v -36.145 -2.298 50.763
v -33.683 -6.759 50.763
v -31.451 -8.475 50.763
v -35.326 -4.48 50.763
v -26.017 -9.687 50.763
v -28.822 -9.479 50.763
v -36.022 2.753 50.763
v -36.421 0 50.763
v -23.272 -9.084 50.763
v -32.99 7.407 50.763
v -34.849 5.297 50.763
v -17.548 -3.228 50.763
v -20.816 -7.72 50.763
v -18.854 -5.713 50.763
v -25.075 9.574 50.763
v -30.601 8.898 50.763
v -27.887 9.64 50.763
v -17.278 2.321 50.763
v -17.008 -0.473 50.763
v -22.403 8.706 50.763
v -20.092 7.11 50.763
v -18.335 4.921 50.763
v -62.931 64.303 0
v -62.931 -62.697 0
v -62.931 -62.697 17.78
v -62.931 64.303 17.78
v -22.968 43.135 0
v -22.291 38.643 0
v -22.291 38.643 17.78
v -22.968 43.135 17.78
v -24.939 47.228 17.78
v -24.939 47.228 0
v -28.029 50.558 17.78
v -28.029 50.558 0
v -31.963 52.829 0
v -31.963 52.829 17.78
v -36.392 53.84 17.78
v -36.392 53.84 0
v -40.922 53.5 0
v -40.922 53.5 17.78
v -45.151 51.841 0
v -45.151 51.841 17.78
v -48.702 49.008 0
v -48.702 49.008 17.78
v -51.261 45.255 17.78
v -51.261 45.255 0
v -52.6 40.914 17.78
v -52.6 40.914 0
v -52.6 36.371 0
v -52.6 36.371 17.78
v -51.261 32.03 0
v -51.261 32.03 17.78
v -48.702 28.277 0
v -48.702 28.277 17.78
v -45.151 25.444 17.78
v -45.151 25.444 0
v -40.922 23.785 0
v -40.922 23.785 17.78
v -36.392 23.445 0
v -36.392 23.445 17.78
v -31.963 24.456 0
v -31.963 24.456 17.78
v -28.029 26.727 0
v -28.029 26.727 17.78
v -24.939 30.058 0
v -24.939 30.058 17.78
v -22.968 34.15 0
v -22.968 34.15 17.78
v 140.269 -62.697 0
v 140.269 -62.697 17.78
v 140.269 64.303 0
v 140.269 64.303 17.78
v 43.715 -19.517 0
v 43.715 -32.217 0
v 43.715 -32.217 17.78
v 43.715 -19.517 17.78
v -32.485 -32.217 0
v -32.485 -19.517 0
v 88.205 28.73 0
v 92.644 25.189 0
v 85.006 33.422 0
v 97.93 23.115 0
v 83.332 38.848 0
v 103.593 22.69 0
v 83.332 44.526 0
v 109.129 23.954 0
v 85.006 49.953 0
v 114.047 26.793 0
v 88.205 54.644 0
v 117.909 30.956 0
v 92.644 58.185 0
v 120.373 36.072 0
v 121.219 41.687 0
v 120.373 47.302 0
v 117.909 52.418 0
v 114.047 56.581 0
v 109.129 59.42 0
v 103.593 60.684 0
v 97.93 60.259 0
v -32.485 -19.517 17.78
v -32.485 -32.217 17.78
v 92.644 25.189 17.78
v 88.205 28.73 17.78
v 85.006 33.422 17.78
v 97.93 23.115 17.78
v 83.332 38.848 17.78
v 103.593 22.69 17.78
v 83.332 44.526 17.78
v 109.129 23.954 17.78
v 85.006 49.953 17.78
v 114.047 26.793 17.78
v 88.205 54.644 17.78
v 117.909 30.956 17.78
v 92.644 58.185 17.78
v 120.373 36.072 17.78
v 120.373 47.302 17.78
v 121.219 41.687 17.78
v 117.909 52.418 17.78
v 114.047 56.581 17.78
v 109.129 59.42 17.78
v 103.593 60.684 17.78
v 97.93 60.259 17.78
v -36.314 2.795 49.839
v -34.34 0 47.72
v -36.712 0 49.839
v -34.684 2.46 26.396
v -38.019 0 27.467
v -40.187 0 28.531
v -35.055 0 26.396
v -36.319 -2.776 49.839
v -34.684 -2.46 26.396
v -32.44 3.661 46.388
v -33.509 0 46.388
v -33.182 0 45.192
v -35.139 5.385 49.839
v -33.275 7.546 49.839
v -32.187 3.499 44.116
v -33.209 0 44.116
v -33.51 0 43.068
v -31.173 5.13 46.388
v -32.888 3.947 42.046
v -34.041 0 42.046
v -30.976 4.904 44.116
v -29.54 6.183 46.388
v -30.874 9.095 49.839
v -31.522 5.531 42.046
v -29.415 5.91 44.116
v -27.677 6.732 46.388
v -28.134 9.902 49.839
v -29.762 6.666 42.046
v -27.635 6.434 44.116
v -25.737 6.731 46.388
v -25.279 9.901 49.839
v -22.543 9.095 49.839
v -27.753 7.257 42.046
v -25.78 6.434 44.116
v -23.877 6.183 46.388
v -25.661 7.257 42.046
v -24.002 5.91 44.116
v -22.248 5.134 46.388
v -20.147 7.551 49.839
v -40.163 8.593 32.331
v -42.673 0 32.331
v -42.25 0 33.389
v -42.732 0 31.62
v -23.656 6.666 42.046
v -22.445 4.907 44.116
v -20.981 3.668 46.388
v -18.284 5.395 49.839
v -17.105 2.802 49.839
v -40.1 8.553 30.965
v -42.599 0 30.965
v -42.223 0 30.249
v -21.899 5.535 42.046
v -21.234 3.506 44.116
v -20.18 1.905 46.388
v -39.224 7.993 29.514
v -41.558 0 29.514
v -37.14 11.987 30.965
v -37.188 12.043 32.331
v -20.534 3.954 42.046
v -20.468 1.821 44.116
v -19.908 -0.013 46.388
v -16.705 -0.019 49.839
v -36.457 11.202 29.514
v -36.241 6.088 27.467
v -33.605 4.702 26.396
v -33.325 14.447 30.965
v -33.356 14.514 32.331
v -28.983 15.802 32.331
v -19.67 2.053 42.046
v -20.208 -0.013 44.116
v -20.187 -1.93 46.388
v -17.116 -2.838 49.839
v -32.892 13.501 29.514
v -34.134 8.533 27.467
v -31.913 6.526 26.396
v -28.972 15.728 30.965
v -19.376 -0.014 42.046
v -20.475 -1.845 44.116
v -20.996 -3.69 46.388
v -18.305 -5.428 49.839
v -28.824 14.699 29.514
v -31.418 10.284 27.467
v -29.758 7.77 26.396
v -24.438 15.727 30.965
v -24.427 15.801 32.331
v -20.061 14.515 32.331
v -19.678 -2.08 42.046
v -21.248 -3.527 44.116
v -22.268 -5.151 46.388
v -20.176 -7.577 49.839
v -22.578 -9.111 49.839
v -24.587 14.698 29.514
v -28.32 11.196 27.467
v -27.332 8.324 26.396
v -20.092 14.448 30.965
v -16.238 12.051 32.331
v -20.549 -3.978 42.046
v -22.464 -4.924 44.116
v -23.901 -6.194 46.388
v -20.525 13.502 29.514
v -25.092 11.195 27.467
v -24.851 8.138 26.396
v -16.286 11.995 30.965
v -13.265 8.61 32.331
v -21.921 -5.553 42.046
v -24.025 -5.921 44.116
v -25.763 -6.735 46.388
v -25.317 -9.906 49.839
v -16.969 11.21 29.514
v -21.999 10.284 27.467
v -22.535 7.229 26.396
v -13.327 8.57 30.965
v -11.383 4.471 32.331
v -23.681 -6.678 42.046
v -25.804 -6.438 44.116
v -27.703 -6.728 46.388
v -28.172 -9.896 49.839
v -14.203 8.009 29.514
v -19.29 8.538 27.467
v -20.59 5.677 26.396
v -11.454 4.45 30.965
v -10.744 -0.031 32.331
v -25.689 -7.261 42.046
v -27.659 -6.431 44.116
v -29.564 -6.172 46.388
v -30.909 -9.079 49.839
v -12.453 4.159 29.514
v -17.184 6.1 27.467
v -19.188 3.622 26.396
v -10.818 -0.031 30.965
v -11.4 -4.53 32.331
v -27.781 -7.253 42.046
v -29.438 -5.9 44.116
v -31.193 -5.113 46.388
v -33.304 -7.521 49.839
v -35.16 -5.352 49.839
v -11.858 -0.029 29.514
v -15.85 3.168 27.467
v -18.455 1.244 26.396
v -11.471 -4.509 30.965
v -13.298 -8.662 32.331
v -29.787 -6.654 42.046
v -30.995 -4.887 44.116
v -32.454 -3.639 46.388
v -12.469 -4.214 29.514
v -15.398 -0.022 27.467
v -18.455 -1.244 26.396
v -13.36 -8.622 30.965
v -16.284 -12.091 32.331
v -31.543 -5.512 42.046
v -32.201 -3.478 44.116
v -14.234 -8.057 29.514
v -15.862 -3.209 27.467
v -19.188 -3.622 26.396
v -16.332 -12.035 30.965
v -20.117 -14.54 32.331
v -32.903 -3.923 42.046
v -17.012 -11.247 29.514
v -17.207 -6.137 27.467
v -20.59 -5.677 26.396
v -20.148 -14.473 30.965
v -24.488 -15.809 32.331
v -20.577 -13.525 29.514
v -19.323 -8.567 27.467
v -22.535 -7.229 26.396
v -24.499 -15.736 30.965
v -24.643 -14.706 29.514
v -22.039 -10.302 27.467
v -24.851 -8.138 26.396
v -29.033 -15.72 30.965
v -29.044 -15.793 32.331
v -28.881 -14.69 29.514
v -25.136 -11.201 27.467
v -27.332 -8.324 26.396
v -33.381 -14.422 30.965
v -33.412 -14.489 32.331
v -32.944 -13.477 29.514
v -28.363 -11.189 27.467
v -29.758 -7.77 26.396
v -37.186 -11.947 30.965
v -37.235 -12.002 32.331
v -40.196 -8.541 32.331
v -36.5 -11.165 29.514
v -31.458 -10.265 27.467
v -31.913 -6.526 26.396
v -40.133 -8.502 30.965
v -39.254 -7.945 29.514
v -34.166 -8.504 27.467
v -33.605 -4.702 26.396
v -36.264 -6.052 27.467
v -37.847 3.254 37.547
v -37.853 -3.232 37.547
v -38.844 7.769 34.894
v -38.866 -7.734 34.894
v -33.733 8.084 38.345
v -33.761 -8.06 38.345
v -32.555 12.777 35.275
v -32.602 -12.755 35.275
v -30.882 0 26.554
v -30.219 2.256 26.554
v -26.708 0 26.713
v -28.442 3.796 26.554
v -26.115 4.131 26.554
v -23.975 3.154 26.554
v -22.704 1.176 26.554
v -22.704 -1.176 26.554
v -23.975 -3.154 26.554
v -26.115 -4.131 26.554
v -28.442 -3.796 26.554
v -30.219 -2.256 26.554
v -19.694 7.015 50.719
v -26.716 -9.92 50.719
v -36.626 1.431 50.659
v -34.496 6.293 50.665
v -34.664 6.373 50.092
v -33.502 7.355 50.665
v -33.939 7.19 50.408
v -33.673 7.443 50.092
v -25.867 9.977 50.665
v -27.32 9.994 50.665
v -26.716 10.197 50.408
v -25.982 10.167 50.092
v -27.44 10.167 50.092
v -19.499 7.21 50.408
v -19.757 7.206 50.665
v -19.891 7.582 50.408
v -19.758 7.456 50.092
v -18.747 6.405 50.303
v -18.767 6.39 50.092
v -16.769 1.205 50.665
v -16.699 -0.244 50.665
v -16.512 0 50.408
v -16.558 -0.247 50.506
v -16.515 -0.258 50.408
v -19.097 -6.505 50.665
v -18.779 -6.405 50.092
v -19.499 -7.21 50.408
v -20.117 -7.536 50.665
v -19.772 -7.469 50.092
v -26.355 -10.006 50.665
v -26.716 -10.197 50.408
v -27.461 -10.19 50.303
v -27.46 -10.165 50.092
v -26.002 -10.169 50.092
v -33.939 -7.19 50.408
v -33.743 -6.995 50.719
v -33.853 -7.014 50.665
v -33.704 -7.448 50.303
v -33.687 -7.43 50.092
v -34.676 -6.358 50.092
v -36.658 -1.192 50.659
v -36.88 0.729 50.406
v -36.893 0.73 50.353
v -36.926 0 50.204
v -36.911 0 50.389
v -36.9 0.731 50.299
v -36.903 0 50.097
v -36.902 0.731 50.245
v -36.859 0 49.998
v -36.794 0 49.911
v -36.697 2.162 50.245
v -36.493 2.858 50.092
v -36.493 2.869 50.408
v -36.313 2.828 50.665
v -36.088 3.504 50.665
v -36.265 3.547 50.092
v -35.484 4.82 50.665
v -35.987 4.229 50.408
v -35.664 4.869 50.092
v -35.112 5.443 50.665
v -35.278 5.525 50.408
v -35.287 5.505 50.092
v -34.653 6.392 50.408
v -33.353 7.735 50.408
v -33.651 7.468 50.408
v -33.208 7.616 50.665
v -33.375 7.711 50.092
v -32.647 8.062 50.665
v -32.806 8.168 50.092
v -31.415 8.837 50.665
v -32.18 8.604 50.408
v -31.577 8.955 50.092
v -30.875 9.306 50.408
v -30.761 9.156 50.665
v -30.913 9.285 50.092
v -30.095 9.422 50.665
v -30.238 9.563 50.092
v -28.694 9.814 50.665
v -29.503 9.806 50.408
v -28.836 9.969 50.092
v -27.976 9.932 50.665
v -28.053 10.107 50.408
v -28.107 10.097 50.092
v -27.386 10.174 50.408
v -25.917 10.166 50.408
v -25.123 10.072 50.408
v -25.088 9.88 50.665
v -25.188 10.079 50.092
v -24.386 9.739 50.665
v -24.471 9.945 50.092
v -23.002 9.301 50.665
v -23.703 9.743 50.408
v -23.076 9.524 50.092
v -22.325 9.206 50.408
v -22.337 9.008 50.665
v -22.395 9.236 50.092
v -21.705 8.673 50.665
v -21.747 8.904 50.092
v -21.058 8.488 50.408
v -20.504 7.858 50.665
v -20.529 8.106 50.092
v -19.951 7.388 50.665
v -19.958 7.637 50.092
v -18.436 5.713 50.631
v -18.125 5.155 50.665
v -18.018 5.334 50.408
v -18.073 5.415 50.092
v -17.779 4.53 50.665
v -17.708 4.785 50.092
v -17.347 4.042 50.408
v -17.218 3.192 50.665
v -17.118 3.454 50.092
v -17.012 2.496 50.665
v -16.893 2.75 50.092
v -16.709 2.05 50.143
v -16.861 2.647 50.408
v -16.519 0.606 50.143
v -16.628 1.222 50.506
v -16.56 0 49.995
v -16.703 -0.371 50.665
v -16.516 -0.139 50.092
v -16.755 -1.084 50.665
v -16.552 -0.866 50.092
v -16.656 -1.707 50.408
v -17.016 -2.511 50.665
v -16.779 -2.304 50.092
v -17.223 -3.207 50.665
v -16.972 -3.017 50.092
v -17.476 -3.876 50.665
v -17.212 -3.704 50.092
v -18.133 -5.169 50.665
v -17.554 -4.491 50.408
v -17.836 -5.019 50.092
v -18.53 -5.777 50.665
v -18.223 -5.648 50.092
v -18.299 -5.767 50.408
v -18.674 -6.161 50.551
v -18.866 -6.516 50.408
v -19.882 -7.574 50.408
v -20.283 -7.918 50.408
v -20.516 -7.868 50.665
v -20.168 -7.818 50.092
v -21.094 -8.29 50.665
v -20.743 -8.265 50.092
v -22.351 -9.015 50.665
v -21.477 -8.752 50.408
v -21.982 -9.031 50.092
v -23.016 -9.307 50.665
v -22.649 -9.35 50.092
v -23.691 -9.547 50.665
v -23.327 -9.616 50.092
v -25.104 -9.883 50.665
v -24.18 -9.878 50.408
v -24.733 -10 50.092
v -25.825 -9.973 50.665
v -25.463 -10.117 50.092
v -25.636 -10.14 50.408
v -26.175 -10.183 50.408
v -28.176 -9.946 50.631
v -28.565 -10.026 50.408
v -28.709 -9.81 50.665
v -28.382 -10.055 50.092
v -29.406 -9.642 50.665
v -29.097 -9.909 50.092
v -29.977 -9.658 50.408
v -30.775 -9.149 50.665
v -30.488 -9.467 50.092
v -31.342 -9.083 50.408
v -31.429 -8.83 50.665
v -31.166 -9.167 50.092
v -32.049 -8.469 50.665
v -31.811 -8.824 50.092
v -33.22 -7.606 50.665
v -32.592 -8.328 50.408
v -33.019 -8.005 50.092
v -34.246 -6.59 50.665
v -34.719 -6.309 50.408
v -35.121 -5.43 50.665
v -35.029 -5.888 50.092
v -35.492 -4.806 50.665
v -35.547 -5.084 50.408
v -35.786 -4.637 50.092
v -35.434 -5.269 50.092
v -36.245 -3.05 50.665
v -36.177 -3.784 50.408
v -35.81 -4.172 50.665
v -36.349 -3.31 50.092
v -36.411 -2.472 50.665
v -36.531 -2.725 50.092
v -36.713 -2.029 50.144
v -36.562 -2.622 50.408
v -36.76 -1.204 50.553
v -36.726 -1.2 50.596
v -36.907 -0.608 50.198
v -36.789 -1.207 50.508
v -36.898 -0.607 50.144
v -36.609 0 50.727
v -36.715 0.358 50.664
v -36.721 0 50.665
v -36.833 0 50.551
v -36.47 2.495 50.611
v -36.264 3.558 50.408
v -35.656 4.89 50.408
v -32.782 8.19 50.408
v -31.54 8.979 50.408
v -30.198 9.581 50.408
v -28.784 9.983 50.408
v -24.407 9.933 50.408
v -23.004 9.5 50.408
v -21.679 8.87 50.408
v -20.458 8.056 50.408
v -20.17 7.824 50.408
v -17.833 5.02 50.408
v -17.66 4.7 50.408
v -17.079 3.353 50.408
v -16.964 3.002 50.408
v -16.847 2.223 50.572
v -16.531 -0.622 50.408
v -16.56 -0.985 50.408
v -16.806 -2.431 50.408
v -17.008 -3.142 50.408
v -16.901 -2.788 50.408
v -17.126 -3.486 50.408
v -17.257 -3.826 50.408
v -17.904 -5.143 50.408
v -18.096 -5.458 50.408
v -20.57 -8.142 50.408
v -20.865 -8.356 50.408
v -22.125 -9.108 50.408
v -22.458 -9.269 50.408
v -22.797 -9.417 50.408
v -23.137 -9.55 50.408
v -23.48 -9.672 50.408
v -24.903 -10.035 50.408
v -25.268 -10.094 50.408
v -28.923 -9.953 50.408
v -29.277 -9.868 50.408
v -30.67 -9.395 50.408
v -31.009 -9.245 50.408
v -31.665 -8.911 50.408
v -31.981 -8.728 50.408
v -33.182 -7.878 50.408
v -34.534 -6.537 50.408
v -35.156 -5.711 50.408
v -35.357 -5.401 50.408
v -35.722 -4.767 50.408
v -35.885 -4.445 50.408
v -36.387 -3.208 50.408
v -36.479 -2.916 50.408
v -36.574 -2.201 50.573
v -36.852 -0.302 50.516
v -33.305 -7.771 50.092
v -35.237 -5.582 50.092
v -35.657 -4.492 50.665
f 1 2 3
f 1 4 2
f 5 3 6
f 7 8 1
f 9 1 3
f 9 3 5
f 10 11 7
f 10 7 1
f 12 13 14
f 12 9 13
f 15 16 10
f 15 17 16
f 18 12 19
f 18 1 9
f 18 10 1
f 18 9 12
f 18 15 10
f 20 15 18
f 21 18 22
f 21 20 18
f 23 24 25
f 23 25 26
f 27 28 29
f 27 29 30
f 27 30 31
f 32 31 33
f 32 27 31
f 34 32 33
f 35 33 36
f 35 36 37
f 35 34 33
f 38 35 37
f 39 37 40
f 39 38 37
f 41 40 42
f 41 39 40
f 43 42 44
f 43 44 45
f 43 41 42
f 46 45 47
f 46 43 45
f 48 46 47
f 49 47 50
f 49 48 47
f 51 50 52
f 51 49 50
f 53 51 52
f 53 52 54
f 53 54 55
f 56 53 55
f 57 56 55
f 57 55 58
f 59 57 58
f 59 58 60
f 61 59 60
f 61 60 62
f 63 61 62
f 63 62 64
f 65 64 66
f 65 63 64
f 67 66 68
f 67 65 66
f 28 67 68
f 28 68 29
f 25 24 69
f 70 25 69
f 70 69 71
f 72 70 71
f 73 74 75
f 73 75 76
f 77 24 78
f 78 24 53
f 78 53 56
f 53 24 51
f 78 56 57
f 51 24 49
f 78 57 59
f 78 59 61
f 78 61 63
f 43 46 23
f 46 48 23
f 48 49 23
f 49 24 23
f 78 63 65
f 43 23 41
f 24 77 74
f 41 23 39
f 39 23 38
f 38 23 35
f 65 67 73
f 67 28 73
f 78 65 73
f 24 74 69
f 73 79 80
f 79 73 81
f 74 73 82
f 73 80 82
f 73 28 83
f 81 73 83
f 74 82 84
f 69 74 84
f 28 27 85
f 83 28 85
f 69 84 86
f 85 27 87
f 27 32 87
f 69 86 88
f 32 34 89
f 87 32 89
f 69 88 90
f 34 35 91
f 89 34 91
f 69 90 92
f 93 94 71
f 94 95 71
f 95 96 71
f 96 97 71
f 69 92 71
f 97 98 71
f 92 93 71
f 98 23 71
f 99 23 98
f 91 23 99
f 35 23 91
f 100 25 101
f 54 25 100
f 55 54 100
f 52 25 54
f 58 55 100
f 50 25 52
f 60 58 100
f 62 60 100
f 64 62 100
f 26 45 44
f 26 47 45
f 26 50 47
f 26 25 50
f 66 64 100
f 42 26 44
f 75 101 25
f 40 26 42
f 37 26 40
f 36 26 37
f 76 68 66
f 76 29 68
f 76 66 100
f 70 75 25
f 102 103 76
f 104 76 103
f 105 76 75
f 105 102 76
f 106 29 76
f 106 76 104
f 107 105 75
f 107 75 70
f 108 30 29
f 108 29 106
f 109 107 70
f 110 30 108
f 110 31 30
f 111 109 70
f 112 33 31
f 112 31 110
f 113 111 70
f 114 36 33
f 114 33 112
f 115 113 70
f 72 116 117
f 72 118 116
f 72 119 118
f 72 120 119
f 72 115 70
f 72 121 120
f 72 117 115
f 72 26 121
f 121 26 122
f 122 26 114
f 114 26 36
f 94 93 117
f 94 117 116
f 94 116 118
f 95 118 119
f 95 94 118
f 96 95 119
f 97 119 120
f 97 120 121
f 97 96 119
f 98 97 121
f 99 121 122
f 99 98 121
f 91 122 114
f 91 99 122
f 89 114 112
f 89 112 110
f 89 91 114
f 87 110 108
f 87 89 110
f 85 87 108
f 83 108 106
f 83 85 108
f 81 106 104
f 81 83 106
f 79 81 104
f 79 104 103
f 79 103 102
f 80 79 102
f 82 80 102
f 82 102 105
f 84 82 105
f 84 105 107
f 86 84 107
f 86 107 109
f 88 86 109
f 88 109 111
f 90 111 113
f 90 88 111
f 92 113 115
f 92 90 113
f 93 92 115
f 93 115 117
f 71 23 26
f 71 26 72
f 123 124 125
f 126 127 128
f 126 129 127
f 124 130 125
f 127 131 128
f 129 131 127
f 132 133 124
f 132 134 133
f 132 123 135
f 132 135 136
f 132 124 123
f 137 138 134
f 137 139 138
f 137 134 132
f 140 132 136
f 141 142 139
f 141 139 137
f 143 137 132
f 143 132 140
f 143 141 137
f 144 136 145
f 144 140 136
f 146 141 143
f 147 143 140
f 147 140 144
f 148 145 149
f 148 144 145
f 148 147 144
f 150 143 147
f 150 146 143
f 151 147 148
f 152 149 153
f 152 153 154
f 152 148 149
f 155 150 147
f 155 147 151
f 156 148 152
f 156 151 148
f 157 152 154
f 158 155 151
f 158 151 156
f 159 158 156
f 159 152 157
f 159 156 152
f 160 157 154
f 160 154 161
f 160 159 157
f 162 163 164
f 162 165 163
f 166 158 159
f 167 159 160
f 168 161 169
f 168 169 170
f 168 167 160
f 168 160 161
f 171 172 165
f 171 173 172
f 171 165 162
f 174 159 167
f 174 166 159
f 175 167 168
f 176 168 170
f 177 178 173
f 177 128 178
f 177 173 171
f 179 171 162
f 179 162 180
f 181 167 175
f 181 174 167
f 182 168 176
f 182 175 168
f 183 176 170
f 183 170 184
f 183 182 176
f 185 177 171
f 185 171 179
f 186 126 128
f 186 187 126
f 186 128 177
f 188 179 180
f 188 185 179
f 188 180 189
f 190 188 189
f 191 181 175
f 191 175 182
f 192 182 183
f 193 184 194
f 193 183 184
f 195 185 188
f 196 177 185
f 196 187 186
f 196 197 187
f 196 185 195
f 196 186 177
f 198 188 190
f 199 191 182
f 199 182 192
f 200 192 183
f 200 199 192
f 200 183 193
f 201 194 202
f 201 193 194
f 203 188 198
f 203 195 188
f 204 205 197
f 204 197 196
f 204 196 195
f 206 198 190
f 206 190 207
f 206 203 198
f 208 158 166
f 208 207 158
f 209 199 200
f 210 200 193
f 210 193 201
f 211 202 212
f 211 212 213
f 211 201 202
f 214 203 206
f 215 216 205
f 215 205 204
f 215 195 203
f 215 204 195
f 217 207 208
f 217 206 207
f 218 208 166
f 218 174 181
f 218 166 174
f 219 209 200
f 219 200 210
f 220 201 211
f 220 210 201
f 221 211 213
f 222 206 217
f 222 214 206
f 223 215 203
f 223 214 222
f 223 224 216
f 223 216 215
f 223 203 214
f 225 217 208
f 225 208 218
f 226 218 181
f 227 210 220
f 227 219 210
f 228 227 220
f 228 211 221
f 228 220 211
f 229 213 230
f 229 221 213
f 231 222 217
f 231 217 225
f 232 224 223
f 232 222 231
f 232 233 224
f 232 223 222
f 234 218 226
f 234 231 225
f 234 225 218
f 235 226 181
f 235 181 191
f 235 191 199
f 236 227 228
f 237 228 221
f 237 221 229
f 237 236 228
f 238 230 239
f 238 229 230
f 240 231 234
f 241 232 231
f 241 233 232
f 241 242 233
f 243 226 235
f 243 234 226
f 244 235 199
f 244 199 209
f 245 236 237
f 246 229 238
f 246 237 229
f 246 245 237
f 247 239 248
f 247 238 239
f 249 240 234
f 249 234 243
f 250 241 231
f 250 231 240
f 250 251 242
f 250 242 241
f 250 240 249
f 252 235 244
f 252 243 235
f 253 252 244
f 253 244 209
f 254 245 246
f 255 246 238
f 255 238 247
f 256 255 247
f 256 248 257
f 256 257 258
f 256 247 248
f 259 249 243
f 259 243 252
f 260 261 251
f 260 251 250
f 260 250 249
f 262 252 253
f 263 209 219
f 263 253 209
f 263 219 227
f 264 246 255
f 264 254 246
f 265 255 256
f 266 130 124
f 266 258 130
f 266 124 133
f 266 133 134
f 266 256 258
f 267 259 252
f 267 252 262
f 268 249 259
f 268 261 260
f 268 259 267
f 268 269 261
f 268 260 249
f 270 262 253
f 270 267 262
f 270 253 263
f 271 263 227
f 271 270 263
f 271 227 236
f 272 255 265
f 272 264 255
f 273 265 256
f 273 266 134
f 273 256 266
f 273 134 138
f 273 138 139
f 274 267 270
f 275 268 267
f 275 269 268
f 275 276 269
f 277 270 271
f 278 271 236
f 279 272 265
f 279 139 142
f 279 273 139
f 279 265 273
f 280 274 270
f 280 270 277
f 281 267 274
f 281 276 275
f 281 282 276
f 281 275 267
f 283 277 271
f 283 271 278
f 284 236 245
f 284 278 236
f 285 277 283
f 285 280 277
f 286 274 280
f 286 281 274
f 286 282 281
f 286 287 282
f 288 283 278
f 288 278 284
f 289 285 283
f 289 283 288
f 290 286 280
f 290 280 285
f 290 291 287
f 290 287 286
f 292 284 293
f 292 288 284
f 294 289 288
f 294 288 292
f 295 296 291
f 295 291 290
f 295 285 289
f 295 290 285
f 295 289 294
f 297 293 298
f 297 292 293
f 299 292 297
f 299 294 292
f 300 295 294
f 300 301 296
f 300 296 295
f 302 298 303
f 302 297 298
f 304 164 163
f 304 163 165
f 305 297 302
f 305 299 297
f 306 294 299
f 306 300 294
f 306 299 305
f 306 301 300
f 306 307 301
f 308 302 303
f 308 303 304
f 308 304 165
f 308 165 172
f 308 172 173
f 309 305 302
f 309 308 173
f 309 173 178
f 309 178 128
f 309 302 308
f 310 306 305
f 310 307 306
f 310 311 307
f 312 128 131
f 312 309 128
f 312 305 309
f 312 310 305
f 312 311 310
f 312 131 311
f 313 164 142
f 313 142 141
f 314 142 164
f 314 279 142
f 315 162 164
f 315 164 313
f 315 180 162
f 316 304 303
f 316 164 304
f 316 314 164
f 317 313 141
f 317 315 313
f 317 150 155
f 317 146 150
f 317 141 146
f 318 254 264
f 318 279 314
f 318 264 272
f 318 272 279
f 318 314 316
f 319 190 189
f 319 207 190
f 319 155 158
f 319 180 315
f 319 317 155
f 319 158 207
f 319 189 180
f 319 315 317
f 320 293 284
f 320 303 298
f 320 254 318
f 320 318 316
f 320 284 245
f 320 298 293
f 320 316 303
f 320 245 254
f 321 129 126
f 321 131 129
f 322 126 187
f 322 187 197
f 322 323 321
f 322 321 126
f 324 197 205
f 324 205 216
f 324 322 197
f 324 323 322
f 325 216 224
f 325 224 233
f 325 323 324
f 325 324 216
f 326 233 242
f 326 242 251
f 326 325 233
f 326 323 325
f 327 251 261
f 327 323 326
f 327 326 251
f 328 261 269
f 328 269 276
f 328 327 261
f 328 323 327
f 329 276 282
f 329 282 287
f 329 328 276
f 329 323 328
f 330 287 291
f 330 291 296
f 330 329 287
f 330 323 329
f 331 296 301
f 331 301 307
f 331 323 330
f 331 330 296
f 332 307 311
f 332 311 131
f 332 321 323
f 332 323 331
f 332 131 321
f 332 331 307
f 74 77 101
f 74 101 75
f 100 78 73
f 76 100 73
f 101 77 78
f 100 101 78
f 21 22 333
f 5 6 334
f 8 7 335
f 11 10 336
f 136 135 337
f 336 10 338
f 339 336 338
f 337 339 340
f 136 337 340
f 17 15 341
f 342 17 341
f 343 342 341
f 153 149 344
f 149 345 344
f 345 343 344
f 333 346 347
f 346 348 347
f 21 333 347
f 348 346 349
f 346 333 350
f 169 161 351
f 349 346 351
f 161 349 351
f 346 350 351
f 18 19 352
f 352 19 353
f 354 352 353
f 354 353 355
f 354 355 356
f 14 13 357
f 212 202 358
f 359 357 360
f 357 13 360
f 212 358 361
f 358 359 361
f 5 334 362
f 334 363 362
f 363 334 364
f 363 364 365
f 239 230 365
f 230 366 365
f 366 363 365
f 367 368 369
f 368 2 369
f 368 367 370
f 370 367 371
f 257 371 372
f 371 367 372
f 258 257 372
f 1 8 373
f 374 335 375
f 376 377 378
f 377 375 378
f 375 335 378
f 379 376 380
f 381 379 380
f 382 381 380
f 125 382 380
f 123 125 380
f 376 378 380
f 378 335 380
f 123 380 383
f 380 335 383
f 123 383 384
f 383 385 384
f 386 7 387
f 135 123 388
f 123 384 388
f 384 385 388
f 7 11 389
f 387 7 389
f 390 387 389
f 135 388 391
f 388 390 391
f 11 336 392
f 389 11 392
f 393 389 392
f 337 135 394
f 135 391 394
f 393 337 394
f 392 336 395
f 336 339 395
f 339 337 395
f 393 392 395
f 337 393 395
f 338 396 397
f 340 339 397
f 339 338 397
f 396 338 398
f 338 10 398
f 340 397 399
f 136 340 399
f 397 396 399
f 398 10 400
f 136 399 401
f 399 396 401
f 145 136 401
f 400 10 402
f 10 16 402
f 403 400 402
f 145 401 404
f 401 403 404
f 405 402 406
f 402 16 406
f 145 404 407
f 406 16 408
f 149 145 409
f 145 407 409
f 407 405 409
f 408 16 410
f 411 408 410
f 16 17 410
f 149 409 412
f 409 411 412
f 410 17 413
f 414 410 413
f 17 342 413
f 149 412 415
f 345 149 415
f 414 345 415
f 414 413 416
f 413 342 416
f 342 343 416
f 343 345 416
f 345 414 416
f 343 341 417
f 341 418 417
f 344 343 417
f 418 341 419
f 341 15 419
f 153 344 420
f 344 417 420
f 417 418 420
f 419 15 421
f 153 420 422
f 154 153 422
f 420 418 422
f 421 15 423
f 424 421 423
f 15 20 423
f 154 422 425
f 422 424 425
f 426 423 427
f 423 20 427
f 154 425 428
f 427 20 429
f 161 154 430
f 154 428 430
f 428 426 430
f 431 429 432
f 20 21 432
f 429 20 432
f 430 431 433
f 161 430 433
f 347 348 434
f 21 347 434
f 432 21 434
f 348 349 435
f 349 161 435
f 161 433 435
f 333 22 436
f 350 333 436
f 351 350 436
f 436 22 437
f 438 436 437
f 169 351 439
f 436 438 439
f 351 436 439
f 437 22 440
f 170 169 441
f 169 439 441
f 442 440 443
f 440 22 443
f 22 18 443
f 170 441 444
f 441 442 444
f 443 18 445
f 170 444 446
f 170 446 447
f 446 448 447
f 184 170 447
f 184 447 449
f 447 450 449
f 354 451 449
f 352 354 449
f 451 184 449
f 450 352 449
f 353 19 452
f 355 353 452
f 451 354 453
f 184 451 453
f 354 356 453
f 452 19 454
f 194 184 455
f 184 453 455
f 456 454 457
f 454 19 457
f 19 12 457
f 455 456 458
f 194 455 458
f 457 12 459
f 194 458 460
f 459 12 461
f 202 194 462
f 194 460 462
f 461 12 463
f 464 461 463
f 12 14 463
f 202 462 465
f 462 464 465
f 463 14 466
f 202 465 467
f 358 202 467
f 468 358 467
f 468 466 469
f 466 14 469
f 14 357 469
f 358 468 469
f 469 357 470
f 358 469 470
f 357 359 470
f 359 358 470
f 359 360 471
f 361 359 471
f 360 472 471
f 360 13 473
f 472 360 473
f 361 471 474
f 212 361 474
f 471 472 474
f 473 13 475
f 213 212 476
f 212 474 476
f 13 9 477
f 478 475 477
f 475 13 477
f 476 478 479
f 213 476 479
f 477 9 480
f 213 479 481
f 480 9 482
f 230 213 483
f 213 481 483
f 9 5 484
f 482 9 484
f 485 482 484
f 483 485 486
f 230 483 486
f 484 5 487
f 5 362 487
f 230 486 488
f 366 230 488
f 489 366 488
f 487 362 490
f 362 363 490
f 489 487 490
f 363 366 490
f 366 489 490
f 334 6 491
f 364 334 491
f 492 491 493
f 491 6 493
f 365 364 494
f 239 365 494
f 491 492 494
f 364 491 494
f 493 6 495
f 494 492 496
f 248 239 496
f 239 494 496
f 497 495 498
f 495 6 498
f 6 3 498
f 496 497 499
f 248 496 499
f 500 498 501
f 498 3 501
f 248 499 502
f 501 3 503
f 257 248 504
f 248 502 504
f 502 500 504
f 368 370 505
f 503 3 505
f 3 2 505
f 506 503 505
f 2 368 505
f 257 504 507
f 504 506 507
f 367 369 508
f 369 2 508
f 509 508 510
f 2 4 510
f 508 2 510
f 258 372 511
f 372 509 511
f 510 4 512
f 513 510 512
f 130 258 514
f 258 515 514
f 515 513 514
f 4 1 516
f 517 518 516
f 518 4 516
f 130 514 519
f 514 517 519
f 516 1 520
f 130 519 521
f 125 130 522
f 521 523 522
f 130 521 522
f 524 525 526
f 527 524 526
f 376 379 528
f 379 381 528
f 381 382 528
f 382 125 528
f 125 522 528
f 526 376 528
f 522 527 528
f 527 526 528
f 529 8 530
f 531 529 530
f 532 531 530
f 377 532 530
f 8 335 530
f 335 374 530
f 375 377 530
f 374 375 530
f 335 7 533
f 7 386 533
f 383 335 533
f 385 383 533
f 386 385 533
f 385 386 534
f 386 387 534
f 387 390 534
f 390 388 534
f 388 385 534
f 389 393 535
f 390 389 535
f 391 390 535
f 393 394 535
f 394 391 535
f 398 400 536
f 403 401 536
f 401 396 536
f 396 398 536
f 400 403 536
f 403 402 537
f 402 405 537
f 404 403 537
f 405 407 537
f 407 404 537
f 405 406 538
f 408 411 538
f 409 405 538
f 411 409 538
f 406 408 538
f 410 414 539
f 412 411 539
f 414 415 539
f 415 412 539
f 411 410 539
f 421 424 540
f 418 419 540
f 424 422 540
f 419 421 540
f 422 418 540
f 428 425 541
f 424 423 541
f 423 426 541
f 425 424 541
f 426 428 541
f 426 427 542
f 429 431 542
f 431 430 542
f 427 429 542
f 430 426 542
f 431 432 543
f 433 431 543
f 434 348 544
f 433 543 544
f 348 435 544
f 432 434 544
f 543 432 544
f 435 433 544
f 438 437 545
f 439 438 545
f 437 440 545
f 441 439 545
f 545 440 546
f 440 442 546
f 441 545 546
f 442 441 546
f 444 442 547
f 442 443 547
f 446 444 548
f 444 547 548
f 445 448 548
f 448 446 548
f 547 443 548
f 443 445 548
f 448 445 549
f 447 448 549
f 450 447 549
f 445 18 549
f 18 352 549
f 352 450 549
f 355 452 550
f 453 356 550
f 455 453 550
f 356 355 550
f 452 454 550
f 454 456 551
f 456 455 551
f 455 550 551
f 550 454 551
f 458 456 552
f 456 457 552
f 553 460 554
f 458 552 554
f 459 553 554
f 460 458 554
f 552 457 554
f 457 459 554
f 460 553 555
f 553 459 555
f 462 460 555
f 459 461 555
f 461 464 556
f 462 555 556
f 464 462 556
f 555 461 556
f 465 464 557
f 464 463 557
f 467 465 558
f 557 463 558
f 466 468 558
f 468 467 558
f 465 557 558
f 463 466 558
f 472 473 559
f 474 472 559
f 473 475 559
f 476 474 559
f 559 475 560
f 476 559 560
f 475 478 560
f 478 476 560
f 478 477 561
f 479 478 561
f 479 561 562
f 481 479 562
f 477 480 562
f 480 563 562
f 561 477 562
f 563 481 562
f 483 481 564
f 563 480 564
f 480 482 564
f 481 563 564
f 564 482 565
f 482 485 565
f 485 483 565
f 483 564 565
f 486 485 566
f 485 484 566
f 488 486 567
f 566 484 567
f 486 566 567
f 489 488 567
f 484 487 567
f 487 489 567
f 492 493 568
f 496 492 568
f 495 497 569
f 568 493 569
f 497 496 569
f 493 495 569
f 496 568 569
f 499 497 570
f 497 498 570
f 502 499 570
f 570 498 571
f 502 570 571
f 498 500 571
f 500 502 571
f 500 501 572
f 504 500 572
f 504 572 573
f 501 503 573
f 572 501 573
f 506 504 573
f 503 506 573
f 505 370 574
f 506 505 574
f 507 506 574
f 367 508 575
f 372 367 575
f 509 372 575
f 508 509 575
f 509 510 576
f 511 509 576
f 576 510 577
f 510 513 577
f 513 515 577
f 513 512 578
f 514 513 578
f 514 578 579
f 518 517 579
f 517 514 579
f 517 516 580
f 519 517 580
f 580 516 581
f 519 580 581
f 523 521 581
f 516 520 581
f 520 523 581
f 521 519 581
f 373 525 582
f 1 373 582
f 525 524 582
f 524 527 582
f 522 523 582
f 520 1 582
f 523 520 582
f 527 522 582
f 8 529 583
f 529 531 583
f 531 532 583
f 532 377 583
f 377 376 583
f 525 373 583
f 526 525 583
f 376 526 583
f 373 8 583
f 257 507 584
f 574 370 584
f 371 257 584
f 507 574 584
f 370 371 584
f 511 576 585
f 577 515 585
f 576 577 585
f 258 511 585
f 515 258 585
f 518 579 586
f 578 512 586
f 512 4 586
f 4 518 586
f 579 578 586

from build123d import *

# Parameters (mm, degrees)
F0_W     = 203.2
F0_H     = 127
F0_W_2   = 76.2
F0_H_2   = 12.7
F0_R     = 15.24
F0_R_2   = 19.05
F1_DEPTH = 17.78
F4_R     = 0.508


with BuildPart() as f1:
    # F0 (on Top) → F1 (new body)
    with BuildSketch(Plane.XY):
        with Locations((38.6694358299, 0.803489238)):
            Rectangle(F0_W, F0_H)
        with Locations((5.614640674, -25.866510762)):
            Rectangle(F0_W_2, F0_H_2, mode=Mode.SUBTRACT)
        with Locations((-37.5305641701, 38.6425306101)):
            Circle(F0_R, mode=Mode.SUBTRACT)
        with Locations((102.1694358299, 41.6870533127)):
            Circle(F0_R_2, mode=Mode.SUBTRACT)
    extrude(amount=F1_DEPTH)


with BuildPart() as f3:
    # F2 (on Front) → F3 (revolve)
    with BuildSketch(Plane.XZ):
        with BuildLine():
            Line((-26.7084483057, 50.7631446134), (-38.1558263673, 50.7631446134))
            add(Edge.make_bspline(
                [(-38.1558263673, 50.7631446134), (-20.2246569097, 40.1995107532), (-58.0900087953, 33.7157212198), (-35.0553236364, 26.3956910868)],
                knots=[0, 0, 0, 0, 24.5639147645, 24.5639147645, 24.5639147645, 24.5639147645], degree=3))
            Line((-35.0553236364, 26.3956910868), (-26.7084483057, 26.7132241279))
            Line((-26.7084483057, 26.7132241279), (-26.7084483057, 50.7631446134))
        make_face()
    revolve(axis=Axis((-26.7084483057, 0, 38.7381843706), (0, 0, -1)))

    # F4
    f4_edges = [f3.edges().sort_by_distance(p)[0] for p in [
        (-15.26107, 0, 50.763145),
    ]]
    fillet(f4_edges, radius=F4_R)


solid = Compound([f1.part, f3.part])
